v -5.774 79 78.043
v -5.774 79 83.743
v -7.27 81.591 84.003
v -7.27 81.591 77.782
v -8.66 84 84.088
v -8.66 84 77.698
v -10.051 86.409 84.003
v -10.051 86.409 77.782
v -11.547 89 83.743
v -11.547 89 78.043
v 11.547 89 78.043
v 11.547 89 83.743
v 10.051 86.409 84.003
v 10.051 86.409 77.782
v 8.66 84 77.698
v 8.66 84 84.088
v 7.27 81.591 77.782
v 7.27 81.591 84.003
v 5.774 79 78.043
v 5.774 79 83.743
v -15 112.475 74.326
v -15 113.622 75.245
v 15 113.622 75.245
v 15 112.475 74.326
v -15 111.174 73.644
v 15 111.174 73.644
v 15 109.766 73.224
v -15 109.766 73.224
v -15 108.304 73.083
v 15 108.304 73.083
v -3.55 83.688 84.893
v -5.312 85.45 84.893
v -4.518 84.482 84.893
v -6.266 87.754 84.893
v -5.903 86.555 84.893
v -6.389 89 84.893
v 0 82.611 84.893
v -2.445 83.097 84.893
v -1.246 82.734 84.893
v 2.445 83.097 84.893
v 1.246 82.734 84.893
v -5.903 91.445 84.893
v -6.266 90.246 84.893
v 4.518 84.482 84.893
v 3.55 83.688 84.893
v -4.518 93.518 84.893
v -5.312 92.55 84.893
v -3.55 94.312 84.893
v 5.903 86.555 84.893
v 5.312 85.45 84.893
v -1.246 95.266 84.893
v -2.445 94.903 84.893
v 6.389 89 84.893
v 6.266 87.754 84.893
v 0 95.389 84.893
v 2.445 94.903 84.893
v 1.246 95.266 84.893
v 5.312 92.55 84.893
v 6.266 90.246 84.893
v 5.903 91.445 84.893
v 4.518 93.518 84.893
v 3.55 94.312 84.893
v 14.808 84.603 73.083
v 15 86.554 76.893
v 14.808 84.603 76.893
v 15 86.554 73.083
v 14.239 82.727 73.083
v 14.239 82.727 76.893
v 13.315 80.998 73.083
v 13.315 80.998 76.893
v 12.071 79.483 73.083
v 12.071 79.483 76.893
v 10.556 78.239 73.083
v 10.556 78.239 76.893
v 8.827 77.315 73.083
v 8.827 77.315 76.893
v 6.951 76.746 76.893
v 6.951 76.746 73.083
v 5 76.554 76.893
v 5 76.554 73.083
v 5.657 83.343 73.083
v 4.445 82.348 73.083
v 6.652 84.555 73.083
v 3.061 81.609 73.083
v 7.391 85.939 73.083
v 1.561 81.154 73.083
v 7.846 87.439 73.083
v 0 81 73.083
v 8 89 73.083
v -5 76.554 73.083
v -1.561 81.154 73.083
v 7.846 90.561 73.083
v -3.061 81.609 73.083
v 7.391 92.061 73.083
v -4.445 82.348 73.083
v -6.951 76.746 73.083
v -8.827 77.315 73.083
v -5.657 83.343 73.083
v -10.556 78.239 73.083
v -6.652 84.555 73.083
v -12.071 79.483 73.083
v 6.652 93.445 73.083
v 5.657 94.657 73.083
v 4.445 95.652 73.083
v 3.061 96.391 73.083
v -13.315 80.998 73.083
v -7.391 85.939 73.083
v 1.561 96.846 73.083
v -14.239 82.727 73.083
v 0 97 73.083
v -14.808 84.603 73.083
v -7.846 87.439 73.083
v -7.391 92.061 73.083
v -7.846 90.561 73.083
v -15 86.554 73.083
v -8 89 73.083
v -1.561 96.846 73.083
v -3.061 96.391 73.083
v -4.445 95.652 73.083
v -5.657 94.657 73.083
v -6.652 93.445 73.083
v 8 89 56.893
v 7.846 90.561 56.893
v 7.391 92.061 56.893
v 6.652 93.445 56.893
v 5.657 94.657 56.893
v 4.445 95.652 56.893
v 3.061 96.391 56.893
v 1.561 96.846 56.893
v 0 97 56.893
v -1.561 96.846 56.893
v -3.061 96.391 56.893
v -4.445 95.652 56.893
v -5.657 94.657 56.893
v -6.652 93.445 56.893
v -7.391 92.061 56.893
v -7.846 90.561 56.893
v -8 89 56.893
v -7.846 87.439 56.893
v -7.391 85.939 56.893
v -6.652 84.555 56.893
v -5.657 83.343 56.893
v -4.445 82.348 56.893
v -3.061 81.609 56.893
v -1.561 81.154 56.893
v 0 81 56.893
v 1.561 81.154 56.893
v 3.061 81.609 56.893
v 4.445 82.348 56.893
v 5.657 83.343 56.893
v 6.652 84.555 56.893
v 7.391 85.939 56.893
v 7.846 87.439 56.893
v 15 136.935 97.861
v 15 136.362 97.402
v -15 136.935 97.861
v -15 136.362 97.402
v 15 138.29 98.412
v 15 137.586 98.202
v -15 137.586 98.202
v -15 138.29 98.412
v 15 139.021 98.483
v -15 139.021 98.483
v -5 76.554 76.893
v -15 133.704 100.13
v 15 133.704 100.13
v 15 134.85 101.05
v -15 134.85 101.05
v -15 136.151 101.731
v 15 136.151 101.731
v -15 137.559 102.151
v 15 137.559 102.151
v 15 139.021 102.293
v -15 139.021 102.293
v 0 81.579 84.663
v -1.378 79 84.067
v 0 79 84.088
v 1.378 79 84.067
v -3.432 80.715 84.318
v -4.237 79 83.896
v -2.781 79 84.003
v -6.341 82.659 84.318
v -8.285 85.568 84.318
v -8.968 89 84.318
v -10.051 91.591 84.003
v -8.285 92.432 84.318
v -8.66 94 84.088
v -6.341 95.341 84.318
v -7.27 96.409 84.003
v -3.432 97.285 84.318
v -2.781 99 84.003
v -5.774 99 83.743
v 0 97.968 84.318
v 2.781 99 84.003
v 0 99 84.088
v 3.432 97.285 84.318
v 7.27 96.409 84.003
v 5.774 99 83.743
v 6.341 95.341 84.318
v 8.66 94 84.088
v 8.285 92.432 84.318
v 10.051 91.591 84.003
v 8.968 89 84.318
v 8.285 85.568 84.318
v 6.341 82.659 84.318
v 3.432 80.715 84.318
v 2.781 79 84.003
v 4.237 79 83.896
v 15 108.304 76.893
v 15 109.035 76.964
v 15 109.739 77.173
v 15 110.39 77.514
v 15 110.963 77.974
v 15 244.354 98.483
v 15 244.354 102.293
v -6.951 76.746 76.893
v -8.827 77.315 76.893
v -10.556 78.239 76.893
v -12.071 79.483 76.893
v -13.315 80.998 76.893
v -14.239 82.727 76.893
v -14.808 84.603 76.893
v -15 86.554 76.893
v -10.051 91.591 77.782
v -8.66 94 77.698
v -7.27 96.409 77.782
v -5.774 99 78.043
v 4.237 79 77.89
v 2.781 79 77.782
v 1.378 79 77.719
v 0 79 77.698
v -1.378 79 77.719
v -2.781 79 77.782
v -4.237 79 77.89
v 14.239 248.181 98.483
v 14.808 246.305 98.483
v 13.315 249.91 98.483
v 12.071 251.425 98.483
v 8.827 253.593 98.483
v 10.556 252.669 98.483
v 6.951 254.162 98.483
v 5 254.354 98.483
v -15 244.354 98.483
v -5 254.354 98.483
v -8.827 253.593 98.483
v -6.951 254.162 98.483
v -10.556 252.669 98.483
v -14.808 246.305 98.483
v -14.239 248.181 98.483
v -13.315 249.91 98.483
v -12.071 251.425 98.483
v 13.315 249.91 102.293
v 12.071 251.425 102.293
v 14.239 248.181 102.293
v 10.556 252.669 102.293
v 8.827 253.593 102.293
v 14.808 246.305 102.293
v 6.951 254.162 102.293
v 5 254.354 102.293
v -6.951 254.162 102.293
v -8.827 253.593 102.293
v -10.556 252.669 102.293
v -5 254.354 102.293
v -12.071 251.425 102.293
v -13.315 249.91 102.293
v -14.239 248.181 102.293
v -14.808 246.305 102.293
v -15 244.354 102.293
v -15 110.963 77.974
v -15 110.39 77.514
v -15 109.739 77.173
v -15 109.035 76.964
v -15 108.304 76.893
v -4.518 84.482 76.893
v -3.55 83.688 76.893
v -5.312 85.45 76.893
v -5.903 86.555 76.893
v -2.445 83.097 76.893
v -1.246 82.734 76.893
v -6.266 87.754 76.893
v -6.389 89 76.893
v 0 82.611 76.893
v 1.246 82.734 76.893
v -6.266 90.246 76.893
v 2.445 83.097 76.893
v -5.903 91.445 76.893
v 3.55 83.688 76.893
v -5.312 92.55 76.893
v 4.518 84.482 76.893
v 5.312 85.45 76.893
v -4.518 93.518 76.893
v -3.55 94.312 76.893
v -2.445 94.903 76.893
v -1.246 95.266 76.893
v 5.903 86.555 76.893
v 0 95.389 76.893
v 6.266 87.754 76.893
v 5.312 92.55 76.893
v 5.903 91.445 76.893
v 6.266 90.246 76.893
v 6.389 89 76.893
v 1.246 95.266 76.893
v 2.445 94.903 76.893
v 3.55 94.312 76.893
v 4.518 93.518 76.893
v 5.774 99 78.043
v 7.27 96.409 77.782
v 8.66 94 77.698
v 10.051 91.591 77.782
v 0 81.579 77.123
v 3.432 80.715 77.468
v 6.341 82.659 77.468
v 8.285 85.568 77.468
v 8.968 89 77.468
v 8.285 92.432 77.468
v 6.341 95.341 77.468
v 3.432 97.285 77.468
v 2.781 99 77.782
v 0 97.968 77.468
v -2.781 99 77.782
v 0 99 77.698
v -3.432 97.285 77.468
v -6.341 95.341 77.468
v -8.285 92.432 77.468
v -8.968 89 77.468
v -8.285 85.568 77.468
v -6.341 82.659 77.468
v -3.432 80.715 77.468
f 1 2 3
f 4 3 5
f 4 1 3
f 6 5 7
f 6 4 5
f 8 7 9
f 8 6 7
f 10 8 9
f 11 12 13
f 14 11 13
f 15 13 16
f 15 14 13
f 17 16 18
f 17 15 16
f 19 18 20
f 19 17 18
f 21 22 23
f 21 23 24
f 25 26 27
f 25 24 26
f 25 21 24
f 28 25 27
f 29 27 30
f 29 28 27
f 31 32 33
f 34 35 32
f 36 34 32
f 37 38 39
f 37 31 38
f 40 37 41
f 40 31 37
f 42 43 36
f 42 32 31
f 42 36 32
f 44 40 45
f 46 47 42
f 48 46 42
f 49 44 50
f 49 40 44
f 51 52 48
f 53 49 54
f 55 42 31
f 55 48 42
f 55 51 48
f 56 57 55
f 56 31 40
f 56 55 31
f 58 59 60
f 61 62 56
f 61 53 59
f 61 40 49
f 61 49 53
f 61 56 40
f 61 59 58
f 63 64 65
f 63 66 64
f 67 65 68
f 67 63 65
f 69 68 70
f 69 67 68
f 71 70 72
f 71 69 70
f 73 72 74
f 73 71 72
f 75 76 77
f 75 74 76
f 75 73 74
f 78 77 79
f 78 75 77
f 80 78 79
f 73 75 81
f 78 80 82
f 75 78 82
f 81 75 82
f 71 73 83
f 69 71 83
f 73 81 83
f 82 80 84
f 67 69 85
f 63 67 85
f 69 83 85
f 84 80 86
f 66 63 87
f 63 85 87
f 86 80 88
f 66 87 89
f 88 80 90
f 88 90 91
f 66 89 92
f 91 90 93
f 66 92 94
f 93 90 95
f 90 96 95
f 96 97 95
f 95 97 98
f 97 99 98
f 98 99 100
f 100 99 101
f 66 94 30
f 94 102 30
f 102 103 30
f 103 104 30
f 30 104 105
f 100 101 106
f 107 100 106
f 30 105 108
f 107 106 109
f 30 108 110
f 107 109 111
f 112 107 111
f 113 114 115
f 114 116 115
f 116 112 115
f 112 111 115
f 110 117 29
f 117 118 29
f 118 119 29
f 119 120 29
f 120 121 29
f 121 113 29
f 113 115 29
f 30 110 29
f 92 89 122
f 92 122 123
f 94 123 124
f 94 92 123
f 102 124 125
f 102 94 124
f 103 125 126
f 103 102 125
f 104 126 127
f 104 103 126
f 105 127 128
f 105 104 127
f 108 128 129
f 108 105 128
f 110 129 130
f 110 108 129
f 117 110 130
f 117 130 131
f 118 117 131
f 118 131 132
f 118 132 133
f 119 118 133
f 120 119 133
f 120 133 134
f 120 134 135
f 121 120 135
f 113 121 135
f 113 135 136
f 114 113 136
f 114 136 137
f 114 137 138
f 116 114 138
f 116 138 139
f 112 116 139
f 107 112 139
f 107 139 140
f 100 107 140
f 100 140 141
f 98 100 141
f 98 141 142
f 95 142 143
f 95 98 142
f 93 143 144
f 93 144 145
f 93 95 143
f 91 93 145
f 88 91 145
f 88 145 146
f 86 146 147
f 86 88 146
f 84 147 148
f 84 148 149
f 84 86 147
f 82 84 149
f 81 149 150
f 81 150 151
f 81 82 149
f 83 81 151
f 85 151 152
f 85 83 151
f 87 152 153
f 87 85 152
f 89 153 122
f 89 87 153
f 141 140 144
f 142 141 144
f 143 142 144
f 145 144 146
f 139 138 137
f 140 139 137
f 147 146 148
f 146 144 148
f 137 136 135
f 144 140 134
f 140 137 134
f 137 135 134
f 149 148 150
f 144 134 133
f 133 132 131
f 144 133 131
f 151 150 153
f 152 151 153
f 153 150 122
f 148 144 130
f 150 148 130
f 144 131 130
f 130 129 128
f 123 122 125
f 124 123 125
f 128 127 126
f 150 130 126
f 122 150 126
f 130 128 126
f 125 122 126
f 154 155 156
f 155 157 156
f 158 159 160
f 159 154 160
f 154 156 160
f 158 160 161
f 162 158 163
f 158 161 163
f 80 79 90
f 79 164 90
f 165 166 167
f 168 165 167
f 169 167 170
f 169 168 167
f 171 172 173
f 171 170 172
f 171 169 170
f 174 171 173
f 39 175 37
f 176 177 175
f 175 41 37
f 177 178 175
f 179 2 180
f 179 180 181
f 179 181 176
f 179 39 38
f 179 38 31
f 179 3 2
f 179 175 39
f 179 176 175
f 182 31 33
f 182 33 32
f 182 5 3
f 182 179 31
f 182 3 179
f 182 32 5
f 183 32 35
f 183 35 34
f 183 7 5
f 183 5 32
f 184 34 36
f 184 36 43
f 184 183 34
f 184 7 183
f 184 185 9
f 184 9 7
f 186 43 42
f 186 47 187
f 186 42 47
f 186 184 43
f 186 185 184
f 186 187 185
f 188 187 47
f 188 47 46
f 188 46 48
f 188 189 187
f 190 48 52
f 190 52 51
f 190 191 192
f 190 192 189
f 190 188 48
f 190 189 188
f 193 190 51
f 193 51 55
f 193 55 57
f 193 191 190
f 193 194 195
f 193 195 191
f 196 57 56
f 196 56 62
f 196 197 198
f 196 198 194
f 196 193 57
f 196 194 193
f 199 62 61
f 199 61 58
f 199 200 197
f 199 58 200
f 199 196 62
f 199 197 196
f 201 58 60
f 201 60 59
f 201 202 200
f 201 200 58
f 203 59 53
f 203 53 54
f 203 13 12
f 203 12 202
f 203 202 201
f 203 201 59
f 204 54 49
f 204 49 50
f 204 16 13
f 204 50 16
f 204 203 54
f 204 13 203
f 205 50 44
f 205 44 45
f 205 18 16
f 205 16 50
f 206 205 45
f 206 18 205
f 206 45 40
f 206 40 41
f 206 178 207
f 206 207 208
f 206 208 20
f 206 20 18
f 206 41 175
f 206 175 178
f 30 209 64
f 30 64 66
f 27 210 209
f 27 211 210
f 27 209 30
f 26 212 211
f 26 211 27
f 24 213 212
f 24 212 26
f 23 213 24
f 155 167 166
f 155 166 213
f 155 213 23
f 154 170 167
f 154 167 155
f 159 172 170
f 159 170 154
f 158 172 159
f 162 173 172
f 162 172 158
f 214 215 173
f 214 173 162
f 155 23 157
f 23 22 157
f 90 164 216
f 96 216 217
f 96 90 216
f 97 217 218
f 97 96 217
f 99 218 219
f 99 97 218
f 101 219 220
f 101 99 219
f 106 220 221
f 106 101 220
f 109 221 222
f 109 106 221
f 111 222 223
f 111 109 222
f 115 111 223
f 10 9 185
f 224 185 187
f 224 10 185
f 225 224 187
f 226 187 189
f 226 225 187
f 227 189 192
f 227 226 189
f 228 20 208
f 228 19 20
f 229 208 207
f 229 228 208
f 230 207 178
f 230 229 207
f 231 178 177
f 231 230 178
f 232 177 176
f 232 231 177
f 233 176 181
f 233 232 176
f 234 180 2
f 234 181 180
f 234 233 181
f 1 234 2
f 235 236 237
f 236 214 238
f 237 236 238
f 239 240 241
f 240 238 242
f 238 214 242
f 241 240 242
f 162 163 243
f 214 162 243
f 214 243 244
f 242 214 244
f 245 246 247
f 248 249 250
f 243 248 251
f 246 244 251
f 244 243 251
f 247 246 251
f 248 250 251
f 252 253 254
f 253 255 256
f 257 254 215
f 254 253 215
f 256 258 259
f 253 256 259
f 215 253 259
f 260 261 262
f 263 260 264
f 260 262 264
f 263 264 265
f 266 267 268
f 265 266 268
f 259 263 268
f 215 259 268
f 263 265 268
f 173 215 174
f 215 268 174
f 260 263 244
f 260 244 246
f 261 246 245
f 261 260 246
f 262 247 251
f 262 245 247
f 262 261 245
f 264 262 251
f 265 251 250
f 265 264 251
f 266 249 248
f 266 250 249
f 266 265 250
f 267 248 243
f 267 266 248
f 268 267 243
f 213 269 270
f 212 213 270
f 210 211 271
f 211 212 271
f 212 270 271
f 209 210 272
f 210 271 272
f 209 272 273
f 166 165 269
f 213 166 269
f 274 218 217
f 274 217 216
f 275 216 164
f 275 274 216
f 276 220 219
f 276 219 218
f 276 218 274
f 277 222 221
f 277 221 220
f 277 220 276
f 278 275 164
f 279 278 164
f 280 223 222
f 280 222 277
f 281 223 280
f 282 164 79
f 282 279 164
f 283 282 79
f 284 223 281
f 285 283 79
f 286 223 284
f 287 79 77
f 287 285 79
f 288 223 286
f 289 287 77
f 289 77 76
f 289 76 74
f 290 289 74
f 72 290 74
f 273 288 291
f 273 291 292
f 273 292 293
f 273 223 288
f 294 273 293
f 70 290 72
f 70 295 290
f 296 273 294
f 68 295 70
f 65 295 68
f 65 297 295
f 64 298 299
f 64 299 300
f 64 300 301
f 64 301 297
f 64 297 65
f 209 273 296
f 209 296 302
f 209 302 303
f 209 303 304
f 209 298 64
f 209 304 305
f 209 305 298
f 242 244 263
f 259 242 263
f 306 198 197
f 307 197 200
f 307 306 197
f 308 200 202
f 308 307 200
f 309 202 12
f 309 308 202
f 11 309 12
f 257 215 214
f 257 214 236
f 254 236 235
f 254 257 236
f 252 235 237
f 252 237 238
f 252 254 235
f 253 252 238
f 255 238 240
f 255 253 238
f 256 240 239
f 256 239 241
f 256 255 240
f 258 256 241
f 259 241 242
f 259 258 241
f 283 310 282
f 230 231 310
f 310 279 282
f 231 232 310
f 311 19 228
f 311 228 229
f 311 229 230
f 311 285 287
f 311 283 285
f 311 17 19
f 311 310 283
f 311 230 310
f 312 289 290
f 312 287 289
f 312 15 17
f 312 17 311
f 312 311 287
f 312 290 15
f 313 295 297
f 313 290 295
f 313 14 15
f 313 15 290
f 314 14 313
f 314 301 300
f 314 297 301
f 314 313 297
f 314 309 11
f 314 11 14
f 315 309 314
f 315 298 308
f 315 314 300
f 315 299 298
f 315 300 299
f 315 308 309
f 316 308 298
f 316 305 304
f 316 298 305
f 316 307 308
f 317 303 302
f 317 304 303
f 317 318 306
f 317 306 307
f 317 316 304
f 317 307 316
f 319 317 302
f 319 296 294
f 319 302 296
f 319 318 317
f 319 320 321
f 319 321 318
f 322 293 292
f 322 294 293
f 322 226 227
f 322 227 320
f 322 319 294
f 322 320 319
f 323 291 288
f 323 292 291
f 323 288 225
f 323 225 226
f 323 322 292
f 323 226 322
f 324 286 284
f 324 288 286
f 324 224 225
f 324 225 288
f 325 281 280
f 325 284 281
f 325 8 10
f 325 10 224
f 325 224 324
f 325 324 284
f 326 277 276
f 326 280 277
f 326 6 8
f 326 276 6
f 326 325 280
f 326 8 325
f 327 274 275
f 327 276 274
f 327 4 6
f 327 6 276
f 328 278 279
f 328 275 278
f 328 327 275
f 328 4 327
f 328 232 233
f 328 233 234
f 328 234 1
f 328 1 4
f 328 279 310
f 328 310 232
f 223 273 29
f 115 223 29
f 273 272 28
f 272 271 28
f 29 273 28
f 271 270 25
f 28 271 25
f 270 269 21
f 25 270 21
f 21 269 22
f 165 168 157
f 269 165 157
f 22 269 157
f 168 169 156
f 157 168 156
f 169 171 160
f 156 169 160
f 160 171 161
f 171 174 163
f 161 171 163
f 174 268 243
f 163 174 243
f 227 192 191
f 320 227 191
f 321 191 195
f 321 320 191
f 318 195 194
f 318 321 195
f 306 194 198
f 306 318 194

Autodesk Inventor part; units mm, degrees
ref_plane "YZ Plane" through (0, 0, 0) normal (1, 0, 0) x (0, 1, 0)
ref_plane "Work Plane11" through (0, 89, 0) normal (0, -1, 0) x (1, 0, 0)
ref_plane "Work Plane12" through (0, 89, 62.5) normal (0, 0, 1) x (1, 0, 0)
sketch "Sketch60" plane through (0, 84.0068, 13.3927) normal (1, 0, 0) x (0, 0, -1)
  line L0 (-59.69, -7.4528) -> (-59.69, 24.2972)
  arc A0 (-59.69, 24.2972) -> (-61.8522, 29.6148) centre (-67.31, 24.2972) ccw
  line L1 (-61.8522, 29.6148) -> (-84.0089, 52.3556)
  arc A1 (-85.09, 55.0144) -> (-84.0089, 52.3556) centre (-81.28, 55.0144) ccw
  line L2 (-85.09, 55.0144) -> (-85.09, 170.3472)
  line L3 (-85.09, 170.3472) -> (-88.9, 170.3472)
  line L4 (-88.9, 170.3472) -> (-88.9, 55.0144)
  arc A2 (-88.9, 55.0144) -> (-86.7378, 49.6968) centre (-81.28, 55.0144) ccw
  line L5 (-86.7378, 49.6968) -> (-64.5811, 26.956)
  arc A3 (-63.5, 24.2972) -> (-64.5811, 26.956) centre (-67.31, 24.2972) ccw
  line L6 (-63.5, 24.2972) -> (-63.5, -7.4528)
  line L7 (-63.5, -7.4528) -> (-59.69, -7.4528)
  line L8 (0, -18.034) -> (0, 124.206)
  line L9 (-28.0662, 4.9932) -> (-56.6073, 4.9932)
  line L10 (-56.6073, -20.0068) -> (-56.6073, 29.9932)
  dimension "d306" = 3.81
  dimension "d307" = 3.81
  dimension "d308" = 3.81
  dimension "d304" = 177.8
  dimension "d311" = 31.75
  dimension "d309" = 31.75
  dimension "d305" = 25.4
  dimension "d310" = 59.69
  dimension "d303" = 12.446
extrude "Extrusion43" add sketch "Sketch60" along normal mid plane 30
fillet "Fillet57" radius 10 4 edges at (-15, 76.554, 74.9877) (15, 76.554, 74.9877) (-15, 254.354, 100.3877) (15, 254.354, 100.3877)
sketch "Sketch61" plane through (-15, 108.304, 76.8927) normal (0, 0, 1) x (1, 0, 0)
  circle A0 centre (15, -19.304) radius 25
  circle A1 centre (15, -19.304) radius 8
  line L0 (3.453, -19.304) -> (9.2265, -9.304)
  line L1 (9.2265, -9.304) -> (20.7735, -9.304)
  line L2 (20.7735, -9.304) -> (26.547, -19.304)
  line L3 (26.547, -19.304) -> (20.7735, -29.304)
  line L4 (20.7735, -29.304) -> (9.2265, -29.304)
  line L5 (9.2265, -29.304) -> (3.453, -19.304)
  dimension "d321" = 16
  dimension "d324" = 20
extrude "Extrusion44" add sketch "Sketch61" against normal blind 20 contours A1
extrude "Extrusion45" add sketch "Sketch61" along normal blind 8 contours A1 | L0 L1 L2 L3 L4 L5
sketch "Sketch62" plane through (0, 0, 0) normal (1, 0, 0) x (0, 1, 0)
  line L0 (89, 76.8927) -> (79, 76.8927) projected
  line L1 (79, 84.8927) -> (89, 84.8927) projected
  line L2 (73.6393, 84.8927) -> (73.6393, 82.8927)
  line L3 (73.6393, 82.8927) -> (82.6108, 84.8927)
  line L4 (73.6393, 76.8927) -> (73.6393, 78.8927)
  line L5 (73.6393, 78.8927) -> (82.6108, 76.8927)
  line L6 (89, 115.9127) -> (89, 52.3527) projected
  line L7 (73.6393, 84.8927) -> (82.6108, 84.8927)
  line L8 (73.6393, 76.8927) -> (82.6108, 76.8927)
  dimension "d330" = 2
revolve "Revolution1" cut sketch "Sketch62" angle 360 about axis through (0, 89, 76.8927) along (0, 0, -1)
equation "\"NB\" = 50"
equation "\"PipeOD\" = 60.325"
equation "\"FlangeOD\" = 165"
equation "\"FlangefaceOD\" = 102"
equation "\"Holedia\" = 19"
equation "\"Holenum\" = 4"
equation "\"PCD\" = 125"
equation "\"Flangethk\" = 16"
equation "\"Flangefacethk\" = 3"
properties part number "Flanged Ball Valve Handle" material "Cast Iron"
